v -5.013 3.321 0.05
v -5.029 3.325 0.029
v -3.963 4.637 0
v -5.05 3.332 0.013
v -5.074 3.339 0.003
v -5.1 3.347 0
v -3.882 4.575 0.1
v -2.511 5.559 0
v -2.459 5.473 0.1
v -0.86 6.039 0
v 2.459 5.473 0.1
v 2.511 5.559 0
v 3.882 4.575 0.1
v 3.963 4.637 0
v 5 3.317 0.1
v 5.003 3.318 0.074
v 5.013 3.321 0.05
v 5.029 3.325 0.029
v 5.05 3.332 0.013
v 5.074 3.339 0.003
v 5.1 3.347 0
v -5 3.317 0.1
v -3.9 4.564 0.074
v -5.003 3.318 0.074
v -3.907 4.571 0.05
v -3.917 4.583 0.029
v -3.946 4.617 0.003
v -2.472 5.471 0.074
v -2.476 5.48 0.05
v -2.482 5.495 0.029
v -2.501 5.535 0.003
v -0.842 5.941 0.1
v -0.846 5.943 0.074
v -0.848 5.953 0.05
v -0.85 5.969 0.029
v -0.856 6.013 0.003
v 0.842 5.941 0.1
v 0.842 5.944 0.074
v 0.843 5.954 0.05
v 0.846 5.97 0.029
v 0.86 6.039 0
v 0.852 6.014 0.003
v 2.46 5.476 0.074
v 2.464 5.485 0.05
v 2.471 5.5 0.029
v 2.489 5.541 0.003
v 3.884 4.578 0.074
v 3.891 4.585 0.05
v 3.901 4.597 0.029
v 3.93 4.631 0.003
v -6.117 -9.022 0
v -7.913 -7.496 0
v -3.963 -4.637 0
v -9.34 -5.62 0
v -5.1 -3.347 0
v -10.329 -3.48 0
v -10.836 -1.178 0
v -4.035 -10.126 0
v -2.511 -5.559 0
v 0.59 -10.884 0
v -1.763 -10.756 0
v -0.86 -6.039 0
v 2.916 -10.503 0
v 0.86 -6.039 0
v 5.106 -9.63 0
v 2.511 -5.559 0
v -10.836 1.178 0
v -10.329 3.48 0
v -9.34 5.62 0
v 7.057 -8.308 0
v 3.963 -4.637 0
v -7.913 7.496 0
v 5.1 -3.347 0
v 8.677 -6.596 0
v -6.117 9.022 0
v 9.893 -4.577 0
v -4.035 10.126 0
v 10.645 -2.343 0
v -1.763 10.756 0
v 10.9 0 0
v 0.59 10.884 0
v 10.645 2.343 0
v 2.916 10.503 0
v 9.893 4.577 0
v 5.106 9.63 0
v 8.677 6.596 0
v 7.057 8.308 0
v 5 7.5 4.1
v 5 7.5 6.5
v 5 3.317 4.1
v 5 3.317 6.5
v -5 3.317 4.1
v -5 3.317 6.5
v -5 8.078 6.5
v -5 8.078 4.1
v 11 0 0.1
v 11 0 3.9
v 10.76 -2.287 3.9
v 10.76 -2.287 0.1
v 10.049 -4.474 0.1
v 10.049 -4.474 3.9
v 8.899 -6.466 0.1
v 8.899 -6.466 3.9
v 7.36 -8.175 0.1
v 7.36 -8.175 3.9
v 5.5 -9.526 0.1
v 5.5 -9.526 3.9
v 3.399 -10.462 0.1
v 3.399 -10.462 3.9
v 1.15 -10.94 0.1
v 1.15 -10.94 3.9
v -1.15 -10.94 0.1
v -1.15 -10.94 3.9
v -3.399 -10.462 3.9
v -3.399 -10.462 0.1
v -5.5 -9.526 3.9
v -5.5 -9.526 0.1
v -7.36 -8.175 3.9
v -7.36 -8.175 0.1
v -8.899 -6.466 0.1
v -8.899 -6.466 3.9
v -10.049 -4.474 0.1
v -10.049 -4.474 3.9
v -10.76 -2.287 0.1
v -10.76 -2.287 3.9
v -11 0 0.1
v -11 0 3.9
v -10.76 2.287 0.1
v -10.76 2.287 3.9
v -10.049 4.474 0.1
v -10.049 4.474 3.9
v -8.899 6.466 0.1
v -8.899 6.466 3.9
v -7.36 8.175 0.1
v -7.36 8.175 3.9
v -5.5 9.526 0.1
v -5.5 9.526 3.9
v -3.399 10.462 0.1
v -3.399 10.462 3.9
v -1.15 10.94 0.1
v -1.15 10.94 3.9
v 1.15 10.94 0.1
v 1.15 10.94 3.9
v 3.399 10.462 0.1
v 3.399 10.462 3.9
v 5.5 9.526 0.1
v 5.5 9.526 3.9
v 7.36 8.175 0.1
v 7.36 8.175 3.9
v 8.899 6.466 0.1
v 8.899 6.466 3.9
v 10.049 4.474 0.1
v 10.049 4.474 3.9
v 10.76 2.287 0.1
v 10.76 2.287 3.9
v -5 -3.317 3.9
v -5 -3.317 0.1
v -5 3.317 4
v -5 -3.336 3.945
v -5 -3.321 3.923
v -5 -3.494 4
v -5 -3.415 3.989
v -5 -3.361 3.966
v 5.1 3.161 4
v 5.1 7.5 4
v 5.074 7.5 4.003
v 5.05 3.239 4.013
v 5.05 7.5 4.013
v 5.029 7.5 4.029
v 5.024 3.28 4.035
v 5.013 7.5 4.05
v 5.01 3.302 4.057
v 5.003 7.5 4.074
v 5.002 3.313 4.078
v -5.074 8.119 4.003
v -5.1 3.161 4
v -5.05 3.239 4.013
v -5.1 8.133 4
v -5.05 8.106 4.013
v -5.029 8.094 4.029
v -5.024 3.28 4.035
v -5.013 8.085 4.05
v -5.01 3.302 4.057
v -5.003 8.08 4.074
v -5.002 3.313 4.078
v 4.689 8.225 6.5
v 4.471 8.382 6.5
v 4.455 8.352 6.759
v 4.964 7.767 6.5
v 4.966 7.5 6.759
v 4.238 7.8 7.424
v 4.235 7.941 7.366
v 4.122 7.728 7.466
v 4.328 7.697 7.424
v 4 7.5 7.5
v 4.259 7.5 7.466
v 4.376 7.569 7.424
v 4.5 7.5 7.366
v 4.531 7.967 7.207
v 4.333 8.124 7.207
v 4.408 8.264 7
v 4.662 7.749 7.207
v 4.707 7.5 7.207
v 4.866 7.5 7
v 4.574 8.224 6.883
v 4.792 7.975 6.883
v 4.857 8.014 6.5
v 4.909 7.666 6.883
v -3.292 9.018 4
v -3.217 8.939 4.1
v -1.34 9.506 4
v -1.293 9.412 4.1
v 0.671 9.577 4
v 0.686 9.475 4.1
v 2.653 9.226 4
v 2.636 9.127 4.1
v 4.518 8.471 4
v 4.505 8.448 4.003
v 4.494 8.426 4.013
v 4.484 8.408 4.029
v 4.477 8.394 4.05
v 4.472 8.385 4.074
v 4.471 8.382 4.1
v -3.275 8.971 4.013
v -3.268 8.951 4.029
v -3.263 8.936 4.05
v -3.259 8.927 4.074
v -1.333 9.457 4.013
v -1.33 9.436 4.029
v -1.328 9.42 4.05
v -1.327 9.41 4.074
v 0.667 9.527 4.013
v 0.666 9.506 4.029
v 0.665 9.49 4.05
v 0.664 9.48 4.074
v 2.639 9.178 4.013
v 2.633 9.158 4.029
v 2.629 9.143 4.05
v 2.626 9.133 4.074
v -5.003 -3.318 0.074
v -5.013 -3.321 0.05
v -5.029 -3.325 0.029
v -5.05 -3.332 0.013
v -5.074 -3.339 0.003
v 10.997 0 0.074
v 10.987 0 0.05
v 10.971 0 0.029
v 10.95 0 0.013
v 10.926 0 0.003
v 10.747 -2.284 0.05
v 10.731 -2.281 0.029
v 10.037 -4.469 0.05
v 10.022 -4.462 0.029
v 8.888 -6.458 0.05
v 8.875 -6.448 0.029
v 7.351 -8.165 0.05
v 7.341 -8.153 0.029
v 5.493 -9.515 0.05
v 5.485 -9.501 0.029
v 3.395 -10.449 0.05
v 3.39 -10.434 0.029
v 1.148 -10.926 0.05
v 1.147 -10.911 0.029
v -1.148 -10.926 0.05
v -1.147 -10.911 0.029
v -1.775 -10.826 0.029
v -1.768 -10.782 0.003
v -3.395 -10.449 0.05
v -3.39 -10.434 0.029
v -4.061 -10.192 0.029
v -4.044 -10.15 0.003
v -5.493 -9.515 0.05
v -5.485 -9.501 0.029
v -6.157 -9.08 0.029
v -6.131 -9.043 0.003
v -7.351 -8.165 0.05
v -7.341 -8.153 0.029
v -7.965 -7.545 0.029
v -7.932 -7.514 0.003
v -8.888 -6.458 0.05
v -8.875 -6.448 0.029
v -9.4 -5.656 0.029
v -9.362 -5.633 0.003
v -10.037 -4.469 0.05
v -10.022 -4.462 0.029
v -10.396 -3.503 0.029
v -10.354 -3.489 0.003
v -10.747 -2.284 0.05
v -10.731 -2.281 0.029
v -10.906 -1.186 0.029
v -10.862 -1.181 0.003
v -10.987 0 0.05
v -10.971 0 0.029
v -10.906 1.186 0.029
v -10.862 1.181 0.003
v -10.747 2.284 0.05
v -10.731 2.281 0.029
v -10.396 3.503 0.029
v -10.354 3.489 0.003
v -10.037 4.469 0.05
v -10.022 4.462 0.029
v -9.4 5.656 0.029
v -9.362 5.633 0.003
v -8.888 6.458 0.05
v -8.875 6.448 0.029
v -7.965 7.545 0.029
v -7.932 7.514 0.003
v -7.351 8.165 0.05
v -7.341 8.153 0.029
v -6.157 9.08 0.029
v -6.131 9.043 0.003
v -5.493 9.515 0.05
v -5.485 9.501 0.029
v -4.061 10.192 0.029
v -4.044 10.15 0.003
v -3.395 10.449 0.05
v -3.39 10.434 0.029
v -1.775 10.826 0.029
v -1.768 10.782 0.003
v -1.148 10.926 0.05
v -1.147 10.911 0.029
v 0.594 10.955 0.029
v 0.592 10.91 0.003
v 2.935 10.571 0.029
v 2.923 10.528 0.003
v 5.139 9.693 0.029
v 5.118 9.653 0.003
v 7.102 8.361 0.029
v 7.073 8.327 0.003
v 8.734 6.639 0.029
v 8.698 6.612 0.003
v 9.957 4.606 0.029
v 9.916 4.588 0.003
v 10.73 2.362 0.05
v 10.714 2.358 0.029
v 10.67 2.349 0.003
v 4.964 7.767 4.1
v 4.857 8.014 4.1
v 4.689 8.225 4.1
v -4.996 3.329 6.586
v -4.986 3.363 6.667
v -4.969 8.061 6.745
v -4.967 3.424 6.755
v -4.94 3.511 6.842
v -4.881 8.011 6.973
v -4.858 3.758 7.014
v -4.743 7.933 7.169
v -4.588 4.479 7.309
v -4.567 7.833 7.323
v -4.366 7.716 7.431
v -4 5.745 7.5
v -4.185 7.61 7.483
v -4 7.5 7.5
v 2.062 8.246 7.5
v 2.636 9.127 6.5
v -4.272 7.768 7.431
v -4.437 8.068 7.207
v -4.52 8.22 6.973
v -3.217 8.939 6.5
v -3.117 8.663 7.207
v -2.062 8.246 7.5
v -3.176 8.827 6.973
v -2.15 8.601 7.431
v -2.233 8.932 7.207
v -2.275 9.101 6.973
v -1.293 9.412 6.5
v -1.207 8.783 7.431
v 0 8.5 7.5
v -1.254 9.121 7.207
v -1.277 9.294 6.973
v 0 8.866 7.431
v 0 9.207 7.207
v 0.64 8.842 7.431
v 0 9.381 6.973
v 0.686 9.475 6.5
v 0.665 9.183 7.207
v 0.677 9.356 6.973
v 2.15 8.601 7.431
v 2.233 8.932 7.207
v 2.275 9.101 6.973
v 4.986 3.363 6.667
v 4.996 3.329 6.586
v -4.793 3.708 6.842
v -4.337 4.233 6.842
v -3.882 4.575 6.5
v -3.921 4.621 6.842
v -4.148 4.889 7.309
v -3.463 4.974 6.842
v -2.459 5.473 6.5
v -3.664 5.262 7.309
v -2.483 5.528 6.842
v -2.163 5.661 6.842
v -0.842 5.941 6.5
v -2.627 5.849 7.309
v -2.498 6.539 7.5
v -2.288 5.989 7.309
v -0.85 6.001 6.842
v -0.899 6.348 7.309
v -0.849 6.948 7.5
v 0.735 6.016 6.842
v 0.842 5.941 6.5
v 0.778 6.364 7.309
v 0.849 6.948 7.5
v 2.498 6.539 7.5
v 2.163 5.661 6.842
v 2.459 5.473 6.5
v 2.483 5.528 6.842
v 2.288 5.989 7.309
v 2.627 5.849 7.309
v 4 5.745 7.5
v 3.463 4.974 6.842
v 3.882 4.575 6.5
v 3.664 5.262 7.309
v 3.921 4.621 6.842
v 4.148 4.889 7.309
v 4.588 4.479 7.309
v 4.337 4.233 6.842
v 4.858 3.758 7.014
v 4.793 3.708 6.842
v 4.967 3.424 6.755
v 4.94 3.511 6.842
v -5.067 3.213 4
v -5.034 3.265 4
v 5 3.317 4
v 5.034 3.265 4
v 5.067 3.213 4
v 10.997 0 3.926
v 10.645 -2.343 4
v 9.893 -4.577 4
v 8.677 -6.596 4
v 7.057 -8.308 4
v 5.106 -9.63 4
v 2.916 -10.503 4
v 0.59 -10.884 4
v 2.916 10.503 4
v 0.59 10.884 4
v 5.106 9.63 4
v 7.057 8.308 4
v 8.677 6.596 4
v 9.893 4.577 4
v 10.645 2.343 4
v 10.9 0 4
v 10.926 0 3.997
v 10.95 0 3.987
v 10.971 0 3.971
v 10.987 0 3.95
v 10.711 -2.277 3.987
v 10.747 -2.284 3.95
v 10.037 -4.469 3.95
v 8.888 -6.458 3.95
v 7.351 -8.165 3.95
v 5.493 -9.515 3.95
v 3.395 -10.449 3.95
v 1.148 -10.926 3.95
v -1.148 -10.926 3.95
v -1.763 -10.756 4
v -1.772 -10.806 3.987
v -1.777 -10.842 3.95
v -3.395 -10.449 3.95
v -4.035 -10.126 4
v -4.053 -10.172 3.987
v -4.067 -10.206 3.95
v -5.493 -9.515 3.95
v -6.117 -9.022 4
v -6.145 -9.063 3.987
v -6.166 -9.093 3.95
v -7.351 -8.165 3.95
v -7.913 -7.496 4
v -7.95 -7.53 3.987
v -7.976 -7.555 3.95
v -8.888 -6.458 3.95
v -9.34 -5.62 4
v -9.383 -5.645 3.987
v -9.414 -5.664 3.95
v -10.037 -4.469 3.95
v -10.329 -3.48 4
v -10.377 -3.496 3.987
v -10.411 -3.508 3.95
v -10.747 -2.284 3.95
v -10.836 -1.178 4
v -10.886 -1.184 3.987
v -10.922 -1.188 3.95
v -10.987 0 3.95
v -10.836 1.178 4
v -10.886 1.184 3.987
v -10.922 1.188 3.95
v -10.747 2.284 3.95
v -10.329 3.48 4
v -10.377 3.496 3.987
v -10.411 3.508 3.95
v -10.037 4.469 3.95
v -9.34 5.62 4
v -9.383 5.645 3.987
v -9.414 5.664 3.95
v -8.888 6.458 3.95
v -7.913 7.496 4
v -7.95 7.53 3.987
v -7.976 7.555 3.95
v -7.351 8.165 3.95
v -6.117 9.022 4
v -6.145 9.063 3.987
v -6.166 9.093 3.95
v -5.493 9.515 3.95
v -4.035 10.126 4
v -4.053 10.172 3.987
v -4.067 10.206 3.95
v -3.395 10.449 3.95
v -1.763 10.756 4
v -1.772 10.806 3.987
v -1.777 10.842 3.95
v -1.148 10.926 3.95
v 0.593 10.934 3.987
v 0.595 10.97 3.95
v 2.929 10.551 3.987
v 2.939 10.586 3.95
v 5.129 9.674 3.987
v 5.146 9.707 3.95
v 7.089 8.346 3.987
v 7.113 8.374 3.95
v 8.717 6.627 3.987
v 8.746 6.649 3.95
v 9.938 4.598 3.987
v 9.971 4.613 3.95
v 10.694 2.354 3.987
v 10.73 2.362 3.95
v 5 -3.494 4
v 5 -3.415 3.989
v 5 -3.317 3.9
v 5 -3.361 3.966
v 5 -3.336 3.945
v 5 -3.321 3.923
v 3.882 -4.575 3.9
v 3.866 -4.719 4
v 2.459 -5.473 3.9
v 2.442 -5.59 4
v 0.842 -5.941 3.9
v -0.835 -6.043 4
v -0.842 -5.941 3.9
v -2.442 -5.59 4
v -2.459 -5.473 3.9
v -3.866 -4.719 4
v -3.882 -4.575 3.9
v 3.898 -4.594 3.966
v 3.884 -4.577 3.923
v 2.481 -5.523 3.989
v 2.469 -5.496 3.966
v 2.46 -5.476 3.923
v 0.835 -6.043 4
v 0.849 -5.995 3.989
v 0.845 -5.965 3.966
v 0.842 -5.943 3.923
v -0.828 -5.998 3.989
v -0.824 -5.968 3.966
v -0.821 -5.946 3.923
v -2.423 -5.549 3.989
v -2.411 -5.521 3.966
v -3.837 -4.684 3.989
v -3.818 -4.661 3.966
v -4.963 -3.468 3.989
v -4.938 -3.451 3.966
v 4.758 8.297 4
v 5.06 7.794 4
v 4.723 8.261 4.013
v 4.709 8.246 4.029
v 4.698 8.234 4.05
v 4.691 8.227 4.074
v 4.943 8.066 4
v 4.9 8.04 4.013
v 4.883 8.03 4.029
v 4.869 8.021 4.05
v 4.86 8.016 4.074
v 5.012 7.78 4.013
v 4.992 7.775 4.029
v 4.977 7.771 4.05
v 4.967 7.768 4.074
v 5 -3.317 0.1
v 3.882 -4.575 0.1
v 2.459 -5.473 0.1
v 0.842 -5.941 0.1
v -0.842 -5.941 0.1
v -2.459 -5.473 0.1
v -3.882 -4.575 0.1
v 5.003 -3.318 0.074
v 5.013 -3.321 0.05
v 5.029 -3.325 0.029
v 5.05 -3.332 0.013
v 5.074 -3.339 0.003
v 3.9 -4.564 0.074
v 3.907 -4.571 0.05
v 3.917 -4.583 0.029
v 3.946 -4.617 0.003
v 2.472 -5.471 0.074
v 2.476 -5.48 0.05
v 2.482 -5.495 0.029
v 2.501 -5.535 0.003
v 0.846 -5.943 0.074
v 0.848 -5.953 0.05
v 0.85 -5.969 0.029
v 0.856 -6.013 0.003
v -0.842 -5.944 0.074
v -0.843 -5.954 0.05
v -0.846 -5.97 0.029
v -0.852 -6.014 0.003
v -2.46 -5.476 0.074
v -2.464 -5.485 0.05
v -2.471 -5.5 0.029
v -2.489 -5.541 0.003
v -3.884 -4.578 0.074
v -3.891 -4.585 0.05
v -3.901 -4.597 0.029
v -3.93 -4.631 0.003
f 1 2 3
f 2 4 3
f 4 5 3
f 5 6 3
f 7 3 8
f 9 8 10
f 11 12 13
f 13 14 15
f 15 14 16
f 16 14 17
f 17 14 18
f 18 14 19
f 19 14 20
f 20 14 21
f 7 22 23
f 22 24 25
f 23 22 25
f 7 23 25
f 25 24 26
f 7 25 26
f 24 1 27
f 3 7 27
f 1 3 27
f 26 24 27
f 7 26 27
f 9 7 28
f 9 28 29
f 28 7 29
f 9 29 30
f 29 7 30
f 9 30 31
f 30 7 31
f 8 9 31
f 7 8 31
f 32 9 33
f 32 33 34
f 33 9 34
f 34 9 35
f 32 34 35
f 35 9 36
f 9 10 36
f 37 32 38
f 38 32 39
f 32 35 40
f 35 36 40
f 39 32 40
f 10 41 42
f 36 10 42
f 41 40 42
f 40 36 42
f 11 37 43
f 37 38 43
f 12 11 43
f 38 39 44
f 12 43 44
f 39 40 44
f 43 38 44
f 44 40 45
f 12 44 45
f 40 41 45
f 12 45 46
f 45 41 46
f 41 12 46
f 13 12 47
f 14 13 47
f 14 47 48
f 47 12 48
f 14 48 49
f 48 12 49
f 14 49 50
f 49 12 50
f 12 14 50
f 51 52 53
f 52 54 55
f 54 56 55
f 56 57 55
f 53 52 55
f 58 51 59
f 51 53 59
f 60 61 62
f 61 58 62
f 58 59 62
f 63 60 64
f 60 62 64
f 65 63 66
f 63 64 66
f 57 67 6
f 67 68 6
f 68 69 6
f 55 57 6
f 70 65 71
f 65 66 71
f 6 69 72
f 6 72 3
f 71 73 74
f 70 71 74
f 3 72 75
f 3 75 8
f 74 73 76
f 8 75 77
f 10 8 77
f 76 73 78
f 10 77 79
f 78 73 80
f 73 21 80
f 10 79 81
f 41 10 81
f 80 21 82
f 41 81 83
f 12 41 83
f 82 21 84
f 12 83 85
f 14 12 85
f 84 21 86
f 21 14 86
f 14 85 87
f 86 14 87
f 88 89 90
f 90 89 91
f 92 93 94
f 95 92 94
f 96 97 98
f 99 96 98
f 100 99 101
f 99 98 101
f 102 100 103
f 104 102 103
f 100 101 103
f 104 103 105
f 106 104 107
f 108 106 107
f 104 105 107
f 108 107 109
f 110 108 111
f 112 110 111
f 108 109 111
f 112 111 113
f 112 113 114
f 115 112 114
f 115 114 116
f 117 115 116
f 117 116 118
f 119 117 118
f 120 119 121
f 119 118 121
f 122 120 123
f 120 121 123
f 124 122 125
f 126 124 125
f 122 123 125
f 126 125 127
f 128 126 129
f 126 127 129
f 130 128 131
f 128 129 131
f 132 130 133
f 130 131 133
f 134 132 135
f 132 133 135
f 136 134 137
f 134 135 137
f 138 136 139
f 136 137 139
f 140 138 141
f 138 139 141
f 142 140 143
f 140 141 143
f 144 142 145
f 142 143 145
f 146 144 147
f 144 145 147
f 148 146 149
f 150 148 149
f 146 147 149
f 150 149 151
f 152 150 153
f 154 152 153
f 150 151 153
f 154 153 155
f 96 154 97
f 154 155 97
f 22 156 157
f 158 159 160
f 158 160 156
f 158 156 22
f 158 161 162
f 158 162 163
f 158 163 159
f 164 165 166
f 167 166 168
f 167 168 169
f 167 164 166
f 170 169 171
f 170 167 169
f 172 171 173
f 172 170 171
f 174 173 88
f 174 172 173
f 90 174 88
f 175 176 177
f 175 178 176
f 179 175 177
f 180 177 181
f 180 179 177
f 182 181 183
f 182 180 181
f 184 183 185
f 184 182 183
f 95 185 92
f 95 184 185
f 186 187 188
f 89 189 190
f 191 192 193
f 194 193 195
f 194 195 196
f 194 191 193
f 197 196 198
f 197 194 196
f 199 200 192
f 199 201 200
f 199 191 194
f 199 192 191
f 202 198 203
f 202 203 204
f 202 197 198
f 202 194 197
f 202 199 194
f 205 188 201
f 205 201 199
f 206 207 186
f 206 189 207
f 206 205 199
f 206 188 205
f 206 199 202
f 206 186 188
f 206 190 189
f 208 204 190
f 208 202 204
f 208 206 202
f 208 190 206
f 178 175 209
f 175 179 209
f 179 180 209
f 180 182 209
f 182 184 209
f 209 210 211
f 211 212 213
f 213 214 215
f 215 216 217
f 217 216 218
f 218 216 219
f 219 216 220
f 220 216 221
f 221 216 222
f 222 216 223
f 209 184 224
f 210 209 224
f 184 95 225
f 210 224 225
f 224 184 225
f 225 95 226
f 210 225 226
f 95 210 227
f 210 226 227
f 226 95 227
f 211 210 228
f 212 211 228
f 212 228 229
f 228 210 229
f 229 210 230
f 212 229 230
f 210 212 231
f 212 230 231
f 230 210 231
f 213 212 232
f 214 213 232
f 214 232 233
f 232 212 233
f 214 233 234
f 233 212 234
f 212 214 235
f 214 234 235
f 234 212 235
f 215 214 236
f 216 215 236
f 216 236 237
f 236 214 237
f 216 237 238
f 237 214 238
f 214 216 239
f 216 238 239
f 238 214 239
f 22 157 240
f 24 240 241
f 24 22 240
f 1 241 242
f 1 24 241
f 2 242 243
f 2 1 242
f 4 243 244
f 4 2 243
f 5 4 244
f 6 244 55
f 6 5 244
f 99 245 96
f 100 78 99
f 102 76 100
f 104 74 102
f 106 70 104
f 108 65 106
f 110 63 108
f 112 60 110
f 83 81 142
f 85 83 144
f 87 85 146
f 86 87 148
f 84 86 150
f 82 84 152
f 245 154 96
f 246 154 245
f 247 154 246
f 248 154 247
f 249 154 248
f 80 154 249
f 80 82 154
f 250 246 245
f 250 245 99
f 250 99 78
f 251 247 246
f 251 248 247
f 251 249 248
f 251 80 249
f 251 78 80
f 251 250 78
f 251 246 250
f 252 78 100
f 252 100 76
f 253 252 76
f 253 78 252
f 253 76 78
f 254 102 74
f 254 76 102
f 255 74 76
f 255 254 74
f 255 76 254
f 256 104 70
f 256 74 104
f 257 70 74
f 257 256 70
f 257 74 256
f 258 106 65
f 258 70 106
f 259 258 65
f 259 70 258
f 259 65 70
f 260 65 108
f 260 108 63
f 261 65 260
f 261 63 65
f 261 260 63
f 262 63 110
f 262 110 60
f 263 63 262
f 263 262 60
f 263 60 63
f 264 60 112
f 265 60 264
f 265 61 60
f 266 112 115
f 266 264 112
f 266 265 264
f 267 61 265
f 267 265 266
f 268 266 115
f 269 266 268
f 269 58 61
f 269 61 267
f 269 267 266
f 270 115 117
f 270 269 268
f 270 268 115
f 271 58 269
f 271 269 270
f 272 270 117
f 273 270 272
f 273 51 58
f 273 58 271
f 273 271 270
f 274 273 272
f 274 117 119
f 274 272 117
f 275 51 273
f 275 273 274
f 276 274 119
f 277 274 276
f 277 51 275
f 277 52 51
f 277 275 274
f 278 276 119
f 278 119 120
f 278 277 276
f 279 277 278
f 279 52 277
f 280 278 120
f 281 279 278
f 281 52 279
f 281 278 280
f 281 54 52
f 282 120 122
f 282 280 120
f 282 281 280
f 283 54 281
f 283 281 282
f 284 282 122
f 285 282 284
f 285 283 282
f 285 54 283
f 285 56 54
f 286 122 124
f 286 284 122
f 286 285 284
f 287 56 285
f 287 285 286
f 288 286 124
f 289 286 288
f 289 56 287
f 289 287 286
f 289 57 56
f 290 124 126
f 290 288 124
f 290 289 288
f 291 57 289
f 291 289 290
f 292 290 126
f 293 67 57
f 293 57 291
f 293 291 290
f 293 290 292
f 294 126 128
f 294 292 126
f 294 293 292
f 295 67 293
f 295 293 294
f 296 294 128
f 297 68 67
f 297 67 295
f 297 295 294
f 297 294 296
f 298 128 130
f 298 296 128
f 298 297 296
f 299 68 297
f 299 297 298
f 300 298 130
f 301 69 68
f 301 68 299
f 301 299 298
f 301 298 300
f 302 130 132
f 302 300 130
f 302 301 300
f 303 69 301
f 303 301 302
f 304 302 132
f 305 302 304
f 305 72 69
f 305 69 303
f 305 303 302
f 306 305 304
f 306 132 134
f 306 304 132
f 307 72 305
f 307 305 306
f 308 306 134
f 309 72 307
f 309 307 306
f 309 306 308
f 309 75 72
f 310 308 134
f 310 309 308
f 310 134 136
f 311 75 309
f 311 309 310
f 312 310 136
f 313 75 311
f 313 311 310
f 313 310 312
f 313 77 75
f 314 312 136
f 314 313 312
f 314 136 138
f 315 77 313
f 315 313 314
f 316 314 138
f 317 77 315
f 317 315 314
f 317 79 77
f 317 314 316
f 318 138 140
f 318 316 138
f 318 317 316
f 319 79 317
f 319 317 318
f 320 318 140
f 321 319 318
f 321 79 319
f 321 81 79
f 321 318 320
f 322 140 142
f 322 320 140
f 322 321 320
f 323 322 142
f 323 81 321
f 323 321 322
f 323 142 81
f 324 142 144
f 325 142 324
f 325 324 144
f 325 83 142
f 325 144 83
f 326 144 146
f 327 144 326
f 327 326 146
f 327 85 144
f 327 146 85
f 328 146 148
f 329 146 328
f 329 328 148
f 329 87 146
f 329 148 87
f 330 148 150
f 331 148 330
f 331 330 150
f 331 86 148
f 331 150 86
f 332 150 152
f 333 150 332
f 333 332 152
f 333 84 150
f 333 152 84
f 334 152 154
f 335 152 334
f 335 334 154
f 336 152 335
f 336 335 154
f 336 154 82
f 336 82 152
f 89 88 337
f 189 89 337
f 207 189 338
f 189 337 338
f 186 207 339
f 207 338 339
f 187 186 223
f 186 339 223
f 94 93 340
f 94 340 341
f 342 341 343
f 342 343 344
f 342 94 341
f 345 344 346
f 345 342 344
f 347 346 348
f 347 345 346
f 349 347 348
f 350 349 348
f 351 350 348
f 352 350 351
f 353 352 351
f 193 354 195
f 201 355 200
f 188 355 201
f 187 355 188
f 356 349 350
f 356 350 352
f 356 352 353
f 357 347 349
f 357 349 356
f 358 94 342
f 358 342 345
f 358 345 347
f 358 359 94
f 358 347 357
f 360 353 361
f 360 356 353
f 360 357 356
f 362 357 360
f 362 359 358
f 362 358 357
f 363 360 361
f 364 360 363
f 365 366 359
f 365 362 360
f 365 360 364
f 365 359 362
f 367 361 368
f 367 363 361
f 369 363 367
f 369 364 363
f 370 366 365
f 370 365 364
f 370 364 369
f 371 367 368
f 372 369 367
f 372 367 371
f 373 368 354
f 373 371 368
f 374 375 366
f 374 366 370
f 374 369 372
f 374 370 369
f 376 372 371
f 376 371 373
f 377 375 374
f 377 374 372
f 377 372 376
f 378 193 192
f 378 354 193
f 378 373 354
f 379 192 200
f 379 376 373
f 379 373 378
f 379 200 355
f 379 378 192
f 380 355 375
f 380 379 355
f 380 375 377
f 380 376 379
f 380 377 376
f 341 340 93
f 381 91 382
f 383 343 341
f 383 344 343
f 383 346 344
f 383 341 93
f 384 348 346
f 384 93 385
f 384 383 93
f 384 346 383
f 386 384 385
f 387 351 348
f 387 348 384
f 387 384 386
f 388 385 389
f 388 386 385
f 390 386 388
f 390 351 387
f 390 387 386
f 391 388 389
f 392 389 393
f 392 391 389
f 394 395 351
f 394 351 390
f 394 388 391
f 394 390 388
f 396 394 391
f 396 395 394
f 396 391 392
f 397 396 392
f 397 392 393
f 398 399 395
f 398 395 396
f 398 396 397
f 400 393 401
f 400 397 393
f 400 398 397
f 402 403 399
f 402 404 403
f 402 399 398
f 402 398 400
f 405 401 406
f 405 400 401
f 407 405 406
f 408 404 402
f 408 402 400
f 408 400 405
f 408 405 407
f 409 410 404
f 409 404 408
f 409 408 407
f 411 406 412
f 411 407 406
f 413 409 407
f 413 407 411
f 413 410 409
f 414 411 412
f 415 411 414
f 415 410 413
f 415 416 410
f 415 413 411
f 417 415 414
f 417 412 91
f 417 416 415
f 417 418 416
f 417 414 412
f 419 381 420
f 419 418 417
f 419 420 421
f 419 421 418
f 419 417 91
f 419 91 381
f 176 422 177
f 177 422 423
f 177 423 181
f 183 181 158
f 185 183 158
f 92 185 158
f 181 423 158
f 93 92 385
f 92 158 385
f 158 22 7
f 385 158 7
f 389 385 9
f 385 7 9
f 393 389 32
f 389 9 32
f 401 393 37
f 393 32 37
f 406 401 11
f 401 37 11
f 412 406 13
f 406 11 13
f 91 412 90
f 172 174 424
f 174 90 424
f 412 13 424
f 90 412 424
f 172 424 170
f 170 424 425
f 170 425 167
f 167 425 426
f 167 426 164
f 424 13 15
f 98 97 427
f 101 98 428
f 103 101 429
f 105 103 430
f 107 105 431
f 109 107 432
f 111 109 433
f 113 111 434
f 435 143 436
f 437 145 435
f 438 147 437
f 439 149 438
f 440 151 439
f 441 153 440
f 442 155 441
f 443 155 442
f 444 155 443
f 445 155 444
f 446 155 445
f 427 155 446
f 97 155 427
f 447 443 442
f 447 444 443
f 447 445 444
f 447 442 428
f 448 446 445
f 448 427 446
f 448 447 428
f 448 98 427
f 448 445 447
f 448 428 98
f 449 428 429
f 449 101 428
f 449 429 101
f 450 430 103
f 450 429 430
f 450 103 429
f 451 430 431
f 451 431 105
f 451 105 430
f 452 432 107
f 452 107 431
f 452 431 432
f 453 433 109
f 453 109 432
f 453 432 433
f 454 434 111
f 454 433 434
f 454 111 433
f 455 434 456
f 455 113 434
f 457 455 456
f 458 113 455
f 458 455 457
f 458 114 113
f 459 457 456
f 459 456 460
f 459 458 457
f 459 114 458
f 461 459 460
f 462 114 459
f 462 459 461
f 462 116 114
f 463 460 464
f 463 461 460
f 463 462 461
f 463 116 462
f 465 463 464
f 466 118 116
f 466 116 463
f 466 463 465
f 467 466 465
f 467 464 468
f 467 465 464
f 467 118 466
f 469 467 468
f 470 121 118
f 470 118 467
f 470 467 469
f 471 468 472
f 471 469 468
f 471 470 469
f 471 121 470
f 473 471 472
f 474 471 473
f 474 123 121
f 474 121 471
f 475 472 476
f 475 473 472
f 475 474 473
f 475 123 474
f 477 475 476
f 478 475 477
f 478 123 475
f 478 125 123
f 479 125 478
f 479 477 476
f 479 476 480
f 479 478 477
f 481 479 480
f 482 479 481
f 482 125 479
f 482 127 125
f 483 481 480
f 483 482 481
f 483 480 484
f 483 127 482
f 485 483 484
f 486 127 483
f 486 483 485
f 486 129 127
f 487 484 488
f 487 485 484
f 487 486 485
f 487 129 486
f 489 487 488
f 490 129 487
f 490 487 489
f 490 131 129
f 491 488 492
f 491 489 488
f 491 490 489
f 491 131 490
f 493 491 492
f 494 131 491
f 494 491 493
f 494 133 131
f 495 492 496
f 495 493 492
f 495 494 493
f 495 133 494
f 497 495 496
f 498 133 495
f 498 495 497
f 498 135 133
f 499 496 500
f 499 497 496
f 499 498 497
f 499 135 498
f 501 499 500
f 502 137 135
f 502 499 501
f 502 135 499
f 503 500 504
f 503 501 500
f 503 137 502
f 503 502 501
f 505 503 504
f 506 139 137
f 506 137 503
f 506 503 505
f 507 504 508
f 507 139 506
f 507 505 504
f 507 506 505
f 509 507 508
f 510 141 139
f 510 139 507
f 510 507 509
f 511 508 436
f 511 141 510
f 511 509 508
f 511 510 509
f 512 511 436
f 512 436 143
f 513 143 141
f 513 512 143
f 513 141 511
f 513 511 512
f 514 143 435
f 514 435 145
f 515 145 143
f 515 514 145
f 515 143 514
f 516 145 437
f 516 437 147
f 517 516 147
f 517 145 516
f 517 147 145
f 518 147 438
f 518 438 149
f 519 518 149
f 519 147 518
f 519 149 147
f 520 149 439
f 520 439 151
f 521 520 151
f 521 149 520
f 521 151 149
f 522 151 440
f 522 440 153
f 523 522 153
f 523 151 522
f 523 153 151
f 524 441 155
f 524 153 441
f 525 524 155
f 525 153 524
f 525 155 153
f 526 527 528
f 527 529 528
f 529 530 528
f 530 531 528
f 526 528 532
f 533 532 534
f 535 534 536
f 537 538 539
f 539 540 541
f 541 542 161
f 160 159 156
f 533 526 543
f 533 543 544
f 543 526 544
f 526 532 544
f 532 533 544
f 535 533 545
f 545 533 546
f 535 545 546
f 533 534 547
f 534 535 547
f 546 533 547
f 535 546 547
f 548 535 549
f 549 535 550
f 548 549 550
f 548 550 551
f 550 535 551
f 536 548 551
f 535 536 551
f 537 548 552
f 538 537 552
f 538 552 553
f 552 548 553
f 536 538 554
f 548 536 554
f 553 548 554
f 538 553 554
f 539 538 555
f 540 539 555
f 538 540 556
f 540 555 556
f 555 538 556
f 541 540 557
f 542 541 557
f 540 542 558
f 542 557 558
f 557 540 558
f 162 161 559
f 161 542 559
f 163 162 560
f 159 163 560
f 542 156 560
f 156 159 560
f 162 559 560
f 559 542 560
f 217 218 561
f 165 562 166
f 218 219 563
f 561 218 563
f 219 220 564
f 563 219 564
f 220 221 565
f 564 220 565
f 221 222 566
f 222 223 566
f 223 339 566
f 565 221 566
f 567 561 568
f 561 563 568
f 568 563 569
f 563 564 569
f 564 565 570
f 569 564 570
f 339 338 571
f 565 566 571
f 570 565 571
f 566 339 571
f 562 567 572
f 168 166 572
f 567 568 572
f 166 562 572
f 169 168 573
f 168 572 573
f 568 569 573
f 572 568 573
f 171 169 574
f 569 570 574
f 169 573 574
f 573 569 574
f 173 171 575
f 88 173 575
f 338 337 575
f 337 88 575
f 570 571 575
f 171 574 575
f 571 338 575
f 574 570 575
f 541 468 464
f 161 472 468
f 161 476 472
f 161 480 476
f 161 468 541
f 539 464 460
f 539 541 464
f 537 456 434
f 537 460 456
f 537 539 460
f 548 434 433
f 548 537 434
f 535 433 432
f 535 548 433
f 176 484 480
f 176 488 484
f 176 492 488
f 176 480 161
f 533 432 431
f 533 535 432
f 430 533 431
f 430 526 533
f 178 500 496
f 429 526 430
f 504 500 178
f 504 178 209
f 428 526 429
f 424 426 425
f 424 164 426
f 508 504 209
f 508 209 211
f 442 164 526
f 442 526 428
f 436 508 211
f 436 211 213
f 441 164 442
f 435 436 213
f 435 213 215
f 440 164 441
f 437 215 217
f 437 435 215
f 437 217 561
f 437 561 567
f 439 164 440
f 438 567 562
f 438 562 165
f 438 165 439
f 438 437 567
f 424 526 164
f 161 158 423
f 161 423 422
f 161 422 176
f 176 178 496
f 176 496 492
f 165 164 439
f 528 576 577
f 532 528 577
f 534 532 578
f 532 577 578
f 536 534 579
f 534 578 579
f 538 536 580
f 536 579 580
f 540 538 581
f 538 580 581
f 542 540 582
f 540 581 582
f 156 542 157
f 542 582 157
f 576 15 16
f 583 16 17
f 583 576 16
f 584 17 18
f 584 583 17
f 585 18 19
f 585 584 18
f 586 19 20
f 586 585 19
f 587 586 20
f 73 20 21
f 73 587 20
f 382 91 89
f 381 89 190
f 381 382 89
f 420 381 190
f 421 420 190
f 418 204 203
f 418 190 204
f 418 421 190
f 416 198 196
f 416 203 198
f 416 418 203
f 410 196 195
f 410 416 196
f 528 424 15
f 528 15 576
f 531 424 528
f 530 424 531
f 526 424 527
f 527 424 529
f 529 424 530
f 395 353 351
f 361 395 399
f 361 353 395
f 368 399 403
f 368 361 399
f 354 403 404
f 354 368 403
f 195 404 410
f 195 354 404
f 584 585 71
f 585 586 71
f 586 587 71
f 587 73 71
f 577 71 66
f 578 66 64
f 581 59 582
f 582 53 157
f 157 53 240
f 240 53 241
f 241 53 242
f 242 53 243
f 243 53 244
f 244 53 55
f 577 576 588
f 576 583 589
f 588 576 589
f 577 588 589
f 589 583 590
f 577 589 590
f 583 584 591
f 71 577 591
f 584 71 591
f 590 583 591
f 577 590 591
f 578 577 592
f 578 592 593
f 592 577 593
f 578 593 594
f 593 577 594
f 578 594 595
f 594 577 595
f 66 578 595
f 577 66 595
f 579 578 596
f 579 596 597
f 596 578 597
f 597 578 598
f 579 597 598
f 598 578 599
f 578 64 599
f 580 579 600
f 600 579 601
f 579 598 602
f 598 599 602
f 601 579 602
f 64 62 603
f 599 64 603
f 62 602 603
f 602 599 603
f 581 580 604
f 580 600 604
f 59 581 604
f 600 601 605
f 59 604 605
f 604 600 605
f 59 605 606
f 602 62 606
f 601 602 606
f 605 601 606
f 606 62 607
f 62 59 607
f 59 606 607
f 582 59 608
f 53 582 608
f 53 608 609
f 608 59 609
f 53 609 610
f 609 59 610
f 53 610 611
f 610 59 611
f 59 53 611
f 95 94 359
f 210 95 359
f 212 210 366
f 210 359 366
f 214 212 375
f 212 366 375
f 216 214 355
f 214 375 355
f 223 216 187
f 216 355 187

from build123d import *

# Parameters (mm, degrees)
SALIENTE_EXTRUIR1_DEPTH = 7.5
CORTAR_EXTRUIR1_DEPTH   = 3.5
REDONDEO1_R             = 1
REDONDEO2_R             = 0.1


with BuildPart() as part:
    # Croquis2 → Revolución1 (revolve)
    with BuildSketch(Plane(origin=(0, 0, 0), x_dir=(0, 0, -1), z_dir=(1, 0, 0)), mode=Mode.PRIVATE) as revoluci_n1_sk:
        Polygon((-7.5, 6), (0, 6), (0, 11), (-4, 11), (-4, 9.5), (-7.5, 9.5), align=None)
    revolve(revoluci_n1_sk.sketch.rotate(Axis((0, 0, 7.5), (0, 0, -1)), 90), axis=Axis((0, 0, 7.5), (0, 0, -1)))

    # Croquis3 → Saliente-Extruir1 (add, through all)
    with BuildSketch(Plane.XY.offset(7.5)):
        with BuildLine():
            ThreePointArc((6, 0), (5.744562647, 1.732050808), (5, 3.31662479))
            Line((5, 3.31662479), (5, -3.31662479))
            ThreePointArc((5, -3.31662479), (5.744562647, -1.732050808), (6, 0))
        make_face()
        with BuildLine():
            Line((-5, -3.31662479), (-5, 3.31662479))
            ThreePointArc((-5, 3.31662479), (-6, 0), (-5, -3.31662479))
        make_face()
    extrude(amount=-SALIENTE_EXTRUIR1_DEPTH)

    # Croquis4 → Cortar-Extruir1 (cut)
    with BuildSketch(Plane.XY.offset(7.5)):
        with BuildLine():
            ThreePointArc((9.5, 0), (8.299096336, 4.623310502), (5, 8.077747211))
            Line((5, 8.077747211), (5, 3.31662479))
            Line((5, 3.31662479), (5, -3.31662479))
            Line((5, -3.31662479), (5, -8.077747211))
            ThreePointArc((5, -8.077747211), (8.299096336, -4.623310502), (9.5, 0))
        make_face()
        with BuildLine():
            Line((-5, 3.31662479), (-5, 8.077747211))
            ThreePointArc((-5, 8.077747211), (-9.5, 0), (-5, -8.077747211))
            Line((-5, -8.077747211), (-5, -3.31662479))
            Line((-5, -3.31662479), (-5, 3.31662479))
        make_face()
        with BuildLine():
            Line((-5, -3.31662479), (-5, -8.077747211))
            Line((-5, -8.077747211), (5, -8.077747211))
            Line((5, -8.077747211), (5, -3.31662479))
            ThreePointArc((5, -3.31662479), (0, -6), (-5, -3.31662479))
        make_face()
        with BuildLine():
            Line((5, -8.077747211), (-5, -8.077747211))
            ThreePointArc((-5, -8.077747211), (0, -9.5), (5, -8.077747211))
        make_face()
    extrude(amount=-CORTAR_EXTRUIR1_DEPTH, mode=Mode.SUBTRACT)

    # Redondeo1
    redondeo1_edges = [part.edges().sort_by_distance(p)[0] for p in [
        (-5, 5.697186001, 7.5),
        (5, 5.697186001, 7.5),
        (5, 8.077747211, 5.75),
        (0, 6, 7.5),
        (0, 9.5, 7.5),
    ]]
    fillet(redondeo1_edges, radius=REDONDEO1_R)

    # Redondeo2
    redondeo2_edges = [part.edges().sort_by_distance(p)[0] for p in [
        (-0.30539379, 9.495090028, 4),
        (4.857492926, 8.014495755, 4),
        (0, -6, 4),
        (-5, 5.697186001, 4),
        (5, 5.408312395, 4),
        (-11, 0, 0),
        (-11, 0, 4),
        (-5, 0, 0),
        (5, 0, 0),
        (0, 6, 0),
        (0, -6, 0),
    ]]
    fillet(redondeo2_edges, radius=REDONDEO2_R)


solid = part.part
